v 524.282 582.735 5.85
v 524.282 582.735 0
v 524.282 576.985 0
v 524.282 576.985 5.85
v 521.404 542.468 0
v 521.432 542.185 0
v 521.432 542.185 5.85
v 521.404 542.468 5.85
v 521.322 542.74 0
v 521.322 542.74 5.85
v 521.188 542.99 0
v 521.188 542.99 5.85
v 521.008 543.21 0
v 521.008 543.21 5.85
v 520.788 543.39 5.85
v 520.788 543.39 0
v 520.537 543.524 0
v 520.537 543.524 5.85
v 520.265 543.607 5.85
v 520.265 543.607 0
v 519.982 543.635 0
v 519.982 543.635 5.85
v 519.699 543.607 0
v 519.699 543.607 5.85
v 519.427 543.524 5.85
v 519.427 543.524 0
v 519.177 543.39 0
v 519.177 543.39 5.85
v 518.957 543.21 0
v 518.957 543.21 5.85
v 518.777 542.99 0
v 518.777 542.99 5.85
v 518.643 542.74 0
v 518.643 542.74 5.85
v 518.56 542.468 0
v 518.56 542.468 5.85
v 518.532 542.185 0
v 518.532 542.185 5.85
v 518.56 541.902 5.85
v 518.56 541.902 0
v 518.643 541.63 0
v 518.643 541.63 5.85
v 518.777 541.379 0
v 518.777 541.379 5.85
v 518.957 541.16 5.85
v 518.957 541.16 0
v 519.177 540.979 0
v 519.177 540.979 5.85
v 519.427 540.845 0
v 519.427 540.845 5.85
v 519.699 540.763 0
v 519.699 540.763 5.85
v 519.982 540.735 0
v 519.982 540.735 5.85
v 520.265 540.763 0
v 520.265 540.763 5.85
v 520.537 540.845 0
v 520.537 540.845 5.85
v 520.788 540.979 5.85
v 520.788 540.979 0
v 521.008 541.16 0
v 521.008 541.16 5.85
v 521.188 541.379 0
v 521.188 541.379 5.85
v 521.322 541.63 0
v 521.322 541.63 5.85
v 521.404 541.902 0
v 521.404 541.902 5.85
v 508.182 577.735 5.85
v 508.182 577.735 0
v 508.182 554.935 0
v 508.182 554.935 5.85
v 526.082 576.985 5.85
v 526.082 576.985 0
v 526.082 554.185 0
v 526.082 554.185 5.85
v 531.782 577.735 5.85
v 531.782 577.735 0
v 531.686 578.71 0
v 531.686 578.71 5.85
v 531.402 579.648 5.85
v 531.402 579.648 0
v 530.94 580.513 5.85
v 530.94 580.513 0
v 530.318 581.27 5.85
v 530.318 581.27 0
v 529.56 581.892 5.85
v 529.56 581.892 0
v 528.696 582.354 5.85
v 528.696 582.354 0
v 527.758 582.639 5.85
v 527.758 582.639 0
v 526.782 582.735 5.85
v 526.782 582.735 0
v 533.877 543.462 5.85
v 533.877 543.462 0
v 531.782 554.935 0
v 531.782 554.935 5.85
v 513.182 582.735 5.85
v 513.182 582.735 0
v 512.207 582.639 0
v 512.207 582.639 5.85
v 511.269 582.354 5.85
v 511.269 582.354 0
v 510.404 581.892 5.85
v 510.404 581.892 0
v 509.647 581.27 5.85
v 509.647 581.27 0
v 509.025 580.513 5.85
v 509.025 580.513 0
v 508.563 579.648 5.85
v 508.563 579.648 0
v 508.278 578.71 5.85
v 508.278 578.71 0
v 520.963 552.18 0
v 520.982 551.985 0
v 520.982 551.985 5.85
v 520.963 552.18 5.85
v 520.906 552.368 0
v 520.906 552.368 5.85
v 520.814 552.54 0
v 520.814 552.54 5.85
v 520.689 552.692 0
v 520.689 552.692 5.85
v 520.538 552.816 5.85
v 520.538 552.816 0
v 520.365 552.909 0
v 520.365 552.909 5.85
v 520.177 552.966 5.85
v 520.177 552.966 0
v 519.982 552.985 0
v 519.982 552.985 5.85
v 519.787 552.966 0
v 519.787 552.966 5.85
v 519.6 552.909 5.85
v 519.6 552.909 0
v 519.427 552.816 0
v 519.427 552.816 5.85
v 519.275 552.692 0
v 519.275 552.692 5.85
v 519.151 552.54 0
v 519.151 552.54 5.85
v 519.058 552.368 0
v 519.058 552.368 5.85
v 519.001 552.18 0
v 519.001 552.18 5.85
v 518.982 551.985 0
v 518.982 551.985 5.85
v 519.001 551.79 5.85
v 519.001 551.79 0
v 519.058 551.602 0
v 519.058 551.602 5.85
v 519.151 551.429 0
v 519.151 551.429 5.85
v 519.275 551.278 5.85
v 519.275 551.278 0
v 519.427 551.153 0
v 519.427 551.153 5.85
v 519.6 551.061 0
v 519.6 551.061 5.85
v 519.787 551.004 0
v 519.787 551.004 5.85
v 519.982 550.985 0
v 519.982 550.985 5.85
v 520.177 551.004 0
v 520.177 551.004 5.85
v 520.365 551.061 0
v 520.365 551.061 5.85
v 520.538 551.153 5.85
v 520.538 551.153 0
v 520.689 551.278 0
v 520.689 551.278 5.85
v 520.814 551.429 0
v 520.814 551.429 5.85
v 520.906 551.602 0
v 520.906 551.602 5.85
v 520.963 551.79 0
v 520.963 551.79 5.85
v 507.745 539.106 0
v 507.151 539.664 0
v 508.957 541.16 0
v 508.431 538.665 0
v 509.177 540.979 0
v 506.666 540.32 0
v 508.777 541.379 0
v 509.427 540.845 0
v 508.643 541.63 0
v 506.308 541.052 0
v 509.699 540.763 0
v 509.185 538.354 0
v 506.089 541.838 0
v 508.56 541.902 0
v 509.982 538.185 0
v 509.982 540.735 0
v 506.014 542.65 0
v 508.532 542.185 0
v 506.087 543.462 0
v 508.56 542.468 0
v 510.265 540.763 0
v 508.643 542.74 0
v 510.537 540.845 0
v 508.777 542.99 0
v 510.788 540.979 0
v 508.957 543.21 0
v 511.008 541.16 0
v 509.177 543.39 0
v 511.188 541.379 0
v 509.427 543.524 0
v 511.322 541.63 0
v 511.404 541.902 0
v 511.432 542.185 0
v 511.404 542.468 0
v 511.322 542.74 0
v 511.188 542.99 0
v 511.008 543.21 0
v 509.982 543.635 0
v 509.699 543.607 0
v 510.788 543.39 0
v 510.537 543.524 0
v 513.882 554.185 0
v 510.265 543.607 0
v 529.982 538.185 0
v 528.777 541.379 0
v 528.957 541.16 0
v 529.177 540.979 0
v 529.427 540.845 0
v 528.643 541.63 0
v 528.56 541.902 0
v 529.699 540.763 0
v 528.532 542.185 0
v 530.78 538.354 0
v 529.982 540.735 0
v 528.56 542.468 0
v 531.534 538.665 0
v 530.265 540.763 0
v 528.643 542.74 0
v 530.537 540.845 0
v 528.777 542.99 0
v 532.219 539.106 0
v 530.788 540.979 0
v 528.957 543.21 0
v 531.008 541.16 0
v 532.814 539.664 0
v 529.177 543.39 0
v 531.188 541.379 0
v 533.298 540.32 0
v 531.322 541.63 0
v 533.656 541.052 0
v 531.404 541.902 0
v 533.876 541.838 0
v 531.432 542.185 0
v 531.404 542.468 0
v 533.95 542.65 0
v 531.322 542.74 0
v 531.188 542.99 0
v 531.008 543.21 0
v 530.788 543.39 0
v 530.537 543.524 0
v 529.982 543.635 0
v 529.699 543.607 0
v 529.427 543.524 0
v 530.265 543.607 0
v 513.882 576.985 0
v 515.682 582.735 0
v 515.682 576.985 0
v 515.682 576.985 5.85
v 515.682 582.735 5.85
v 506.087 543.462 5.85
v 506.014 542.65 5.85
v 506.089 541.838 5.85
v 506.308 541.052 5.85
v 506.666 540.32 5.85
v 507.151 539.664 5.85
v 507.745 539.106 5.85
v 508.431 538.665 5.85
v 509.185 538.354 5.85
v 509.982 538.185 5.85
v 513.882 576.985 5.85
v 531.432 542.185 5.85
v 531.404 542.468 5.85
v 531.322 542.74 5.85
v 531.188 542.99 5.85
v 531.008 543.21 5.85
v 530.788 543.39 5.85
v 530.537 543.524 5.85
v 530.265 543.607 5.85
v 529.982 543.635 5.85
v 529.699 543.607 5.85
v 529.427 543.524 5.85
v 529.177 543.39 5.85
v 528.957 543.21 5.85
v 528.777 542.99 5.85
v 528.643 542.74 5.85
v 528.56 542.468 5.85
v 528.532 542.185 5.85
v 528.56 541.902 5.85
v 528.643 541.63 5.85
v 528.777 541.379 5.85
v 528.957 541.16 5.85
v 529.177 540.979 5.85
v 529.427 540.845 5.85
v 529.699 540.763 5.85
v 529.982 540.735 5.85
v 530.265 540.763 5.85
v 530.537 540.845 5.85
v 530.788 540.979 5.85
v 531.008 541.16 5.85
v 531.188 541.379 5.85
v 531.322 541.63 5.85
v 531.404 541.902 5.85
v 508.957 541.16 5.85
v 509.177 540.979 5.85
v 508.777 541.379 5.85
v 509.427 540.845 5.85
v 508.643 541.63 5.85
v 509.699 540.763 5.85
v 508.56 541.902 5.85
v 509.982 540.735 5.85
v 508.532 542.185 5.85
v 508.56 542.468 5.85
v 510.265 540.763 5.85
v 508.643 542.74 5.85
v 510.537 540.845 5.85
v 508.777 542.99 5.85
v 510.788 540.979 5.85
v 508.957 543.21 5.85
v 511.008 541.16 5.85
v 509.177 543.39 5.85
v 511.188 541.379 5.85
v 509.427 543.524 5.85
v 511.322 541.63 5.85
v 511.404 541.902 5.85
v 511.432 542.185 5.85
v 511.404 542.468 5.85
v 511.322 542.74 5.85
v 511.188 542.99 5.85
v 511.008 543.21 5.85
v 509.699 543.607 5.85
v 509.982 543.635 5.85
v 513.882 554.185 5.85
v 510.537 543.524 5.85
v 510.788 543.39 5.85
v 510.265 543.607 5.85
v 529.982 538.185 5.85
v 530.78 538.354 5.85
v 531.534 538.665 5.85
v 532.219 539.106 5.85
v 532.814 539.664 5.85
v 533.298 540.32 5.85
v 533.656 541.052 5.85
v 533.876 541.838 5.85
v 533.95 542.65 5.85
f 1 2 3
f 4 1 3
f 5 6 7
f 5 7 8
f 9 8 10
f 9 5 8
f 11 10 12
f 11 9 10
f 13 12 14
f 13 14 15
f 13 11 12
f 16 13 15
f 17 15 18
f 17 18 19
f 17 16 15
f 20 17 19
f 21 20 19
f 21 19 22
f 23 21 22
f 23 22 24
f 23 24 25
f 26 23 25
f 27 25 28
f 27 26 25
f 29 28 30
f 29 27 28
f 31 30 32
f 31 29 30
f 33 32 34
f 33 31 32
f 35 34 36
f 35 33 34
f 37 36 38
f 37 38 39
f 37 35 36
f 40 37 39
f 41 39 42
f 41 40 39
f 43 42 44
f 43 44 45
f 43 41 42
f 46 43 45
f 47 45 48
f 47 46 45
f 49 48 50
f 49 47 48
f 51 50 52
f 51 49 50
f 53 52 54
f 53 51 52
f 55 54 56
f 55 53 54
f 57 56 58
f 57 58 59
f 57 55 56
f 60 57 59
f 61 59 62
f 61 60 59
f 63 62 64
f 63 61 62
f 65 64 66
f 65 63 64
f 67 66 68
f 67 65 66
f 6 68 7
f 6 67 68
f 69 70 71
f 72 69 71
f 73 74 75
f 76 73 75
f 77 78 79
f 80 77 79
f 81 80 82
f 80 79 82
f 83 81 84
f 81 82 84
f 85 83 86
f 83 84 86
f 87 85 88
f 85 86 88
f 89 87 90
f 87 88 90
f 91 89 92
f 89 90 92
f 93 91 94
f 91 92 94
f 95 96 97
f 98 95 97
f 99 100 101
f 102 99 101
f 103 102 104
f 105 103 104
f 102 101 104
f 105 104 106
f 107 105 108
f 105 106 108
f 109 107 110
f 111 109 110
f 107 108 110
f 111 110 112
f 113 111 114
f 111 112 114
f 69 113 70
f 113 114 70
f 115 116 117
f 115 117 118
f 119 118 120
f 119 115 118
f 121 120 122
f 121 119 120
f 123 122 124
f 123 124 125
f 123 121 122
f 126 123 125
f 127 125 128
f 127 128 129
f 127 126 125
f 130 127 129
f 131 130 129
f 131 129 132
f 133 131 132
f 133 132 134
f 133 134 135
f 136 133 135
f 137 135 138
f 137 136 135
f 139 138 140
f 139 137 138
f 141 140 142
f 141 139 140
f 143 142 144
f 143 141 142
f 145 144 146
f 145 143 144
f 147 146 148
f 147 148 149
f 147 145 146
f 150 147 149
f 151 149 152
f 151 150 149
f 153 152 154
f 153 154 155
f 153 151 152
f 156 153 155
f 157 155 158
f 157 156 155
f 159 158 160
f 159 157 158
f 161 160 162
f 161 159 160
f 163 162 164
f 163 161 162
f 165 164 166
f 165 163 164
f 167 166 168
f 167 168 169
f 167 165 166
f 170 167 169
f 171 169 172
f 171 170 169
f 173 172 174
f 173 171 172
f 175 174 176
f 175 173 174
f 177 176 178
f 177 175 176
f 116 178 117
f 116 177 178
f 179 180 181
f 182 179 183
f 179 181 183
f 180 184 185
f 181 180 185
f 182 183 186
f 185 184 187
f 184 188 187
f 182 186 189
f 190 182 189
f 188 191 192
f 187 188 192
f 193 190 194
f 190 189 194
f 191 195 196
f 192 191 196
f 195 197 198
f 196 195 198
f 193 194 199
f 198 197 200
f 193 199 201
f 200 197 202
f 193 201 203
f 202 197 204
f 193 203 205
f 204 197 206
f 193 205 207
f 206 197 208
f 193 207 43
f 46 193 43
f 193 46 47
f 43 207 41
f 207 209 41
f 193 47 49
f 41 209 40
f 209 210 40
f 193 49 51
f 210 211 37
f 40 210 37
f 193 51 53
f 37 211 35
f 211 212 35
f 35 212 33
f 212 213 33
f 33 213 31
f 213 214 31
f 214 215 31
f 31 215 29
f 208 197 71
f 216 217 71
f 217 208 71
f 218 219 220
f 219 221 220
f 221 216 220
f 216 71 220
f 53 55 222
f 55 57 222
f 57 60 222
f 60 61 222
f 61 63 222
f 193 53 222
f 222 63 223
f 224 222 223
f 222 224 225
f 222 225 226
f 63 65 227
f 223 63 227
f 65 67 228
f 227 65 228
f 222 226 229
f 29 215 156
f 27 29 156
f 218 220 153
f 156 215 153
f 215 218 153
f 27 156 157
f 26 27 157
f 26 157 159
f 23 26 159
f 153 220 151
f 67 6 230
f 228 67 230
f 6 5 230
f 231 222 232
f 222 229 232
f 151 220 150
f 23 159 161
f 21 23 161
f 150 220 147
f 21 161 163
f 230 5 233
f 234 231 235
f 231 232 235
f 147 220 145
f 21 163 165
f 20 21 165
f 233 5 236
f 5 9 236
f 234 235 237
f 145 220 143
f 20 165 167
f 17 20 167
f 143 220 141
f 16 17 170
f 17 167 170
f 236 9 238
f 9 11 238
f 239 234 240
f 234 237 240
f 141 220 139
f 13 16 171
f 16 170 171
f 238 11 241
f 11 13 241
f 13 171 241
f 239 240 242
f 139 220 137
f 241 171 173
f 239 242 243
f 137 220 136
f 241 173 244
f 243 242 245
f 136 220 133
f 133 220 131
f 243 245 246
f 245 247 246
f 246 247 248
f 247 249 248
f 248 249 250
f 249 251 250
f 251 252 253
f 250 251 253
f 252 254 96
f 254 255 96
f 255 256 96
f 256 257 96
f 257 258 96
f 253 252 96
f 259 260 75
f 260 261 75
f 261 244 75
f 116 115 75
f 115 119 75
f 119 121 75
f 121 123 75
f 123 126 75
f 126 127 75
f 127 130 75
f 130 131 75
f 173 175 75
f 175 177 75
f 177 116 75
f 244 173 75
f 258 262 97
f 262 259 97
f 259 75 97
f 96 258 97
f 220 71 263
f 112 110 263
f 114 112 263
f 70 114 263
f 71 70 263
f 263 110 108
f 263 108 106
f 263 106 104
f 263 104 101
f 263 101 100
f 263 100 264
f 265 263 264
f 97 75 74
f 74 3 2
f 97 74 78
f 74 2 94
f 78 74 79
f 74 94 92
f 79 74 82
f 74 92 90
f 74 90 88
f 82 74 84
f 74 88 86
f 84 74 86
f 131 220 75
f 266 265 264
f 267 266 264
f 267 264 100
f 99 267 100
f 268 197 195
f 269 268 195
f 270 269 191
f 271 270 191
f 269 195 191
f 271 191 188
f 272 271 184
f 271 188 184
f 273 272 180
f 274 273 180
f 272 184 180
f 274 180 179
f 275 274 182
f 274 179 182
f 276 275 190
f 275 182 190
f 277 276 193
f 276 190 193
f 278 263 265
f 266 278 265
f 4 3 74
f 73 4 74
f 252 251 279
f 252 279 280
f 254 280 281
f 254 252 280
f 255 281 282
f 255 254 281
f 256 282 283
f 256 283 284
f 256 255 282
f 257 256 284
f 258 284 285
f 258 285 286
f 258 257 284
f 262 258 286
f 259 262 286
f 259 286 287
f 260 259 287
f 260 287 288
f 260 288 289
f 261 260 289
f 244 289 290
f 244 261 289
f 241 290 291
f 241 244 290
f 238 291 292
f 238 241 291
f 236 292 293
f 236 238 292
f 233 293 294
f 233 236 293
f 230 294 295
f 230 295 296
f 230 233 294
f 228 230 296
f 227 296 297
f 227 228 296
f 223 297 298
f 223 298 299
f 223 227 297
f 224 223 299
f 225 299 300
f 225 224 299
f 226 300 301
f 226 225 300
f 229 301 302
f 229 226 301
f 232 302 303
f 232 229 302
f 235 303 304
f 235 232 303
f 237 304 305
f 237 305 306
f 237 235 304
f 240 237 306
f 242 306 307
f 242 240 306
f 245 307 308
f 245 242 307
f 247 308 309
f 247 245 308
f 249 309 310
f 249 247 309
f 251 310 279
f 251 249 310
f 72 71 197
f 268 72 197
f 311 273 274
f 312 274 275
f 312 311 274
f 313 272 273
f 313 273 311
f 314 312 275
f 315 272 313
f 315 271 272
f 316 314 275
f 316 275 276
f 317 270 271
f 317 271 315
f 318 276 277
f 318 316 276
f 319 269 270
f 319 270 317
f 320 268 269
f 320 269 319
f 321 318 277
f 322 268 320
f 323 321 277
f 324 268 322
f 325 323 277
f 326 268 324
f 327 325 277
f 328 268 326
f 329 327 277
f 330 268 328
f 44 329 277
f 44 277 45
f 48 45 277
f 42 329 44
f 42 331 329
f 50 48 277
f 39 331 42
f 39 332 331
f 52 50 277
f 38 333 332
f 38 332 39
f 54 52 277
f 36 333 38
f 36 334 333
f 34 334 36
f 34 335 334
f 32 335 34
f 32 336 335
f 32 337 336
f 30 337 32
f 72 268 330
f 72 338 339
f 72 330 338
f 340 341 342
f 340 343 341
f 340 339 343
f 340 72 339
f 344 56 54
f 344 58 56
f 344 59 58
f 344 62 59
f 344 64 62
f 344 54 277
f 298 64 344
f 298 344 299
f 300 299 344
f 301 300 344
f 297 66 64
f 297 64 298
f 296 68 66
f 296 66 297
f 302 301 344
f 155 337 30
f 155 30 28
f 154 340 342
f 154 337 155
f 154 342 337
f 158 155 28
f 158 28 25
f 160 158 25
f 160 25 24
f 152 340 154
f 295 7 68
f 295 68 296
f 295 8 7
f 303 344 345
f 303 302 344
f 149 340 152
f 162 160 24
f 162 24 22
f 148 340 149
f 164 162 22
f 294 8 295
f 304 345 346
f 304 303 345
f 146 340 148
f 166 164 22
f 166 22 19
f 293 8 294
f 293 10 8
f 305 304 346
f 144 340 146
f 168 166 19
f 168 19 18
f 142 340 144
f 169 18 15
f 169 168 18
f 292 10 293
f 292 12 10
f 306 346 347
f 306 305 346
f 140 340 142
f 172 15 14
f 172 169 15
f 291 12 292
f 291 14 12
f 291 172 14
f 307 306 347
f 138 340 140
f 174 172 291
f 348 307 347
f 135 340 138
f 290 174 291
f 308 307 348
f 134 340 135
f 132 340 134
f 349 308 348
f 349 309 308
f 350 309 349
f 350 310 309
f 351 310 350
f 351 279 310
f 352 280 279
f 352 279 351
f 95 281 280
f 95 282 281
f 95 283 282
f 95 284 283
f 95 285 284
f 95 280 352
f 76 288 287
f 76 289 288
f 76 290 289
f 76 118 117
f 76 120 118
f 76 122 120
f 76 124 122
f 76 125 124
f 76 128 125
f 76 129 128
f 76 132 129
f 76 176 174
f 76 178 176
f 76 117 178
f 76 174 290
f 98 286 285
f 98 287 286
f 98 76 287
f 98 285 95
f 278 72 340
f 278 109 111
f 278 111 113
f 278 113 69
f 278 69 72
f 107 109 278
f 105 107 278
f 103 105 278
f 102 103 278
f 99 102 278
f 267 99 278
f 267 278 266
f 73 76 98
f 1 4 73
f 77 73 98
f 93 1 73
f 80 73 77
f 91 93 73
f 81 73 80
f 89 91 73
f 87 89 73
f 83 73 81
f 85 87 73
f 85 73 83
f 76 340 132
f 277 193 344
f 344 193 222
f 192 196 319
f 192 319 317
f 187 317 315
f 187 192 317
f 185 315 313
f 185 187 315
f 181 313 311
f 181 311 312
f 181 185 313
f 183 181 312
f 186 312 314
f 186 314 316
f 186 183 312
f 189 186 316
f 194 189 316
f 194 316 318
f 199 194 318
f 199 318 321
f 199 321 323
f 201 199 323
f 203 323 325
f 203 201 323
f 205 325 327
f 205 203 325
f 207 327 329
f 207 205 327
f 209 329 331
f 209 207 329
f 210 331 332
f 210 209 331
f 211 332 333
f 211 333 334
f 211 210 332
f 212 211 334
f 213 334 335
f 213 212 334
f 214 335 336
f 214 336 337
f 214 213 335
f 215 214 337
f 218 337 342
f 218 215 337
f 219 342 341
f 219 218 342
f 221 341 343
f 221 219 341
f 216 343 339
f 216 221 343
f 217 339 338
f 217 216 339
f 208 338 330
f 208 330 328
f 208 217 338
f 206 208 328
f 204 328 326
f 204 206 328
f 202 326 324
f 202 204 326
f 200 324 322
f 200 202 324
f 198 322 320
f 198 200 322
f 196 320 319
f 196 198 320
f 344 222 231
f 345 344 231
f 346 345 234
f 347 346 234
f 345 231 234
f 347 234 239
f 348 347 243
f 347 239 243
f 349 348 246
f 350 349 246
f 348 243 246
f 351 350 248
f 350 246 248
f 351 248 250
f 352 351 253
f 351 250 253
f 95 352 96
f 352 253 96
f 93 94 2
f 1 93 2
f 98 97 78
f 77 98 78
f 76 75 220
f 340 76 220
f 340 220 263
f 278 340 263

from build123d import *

# Parameters (mm, degrees)
MODEL_R             = 1.45
MODEL_R_2           = 1
BOSS_EXTRUDE1_DEPTH = 5.85


with BuildPart() as part:
    # Model → Boss-Extrude1 (new body)
    with BuildSketch(Plane.XY):
        with BuildLine():
            Line((508.182236888, 554.934833401), (506.087301785, 543.461595882))
            ThreePointArc((506.087301785, 543.461595882), (506.893587564, 539.980874482), (509.982236888, 538.184833401))
            Line((509.982236888, 538.184833401), (529.982236888, 538.184833401))
            ThreePointArc((529.982236888, 538.184833401), (533.070886212, 539.980874482), (533.877171991, 543.461595882))
            Line((533.877171991, 543.461595882), (531.782236888, 554.934833401))
            Line((531.782236888, 554.934833401), (531.782236888, 577.734833401))
            ThreePointArc((531.782236888, 577.734833401), (530.317770794, 581.270367307), (526.782236888, 582.734833401))
            Line((526.782236888, 582.734833401), (524.282236888, 582.734833401))
            Line((524.282236888, 582.734833401), (524.282236888, 576.984833401))
            Line((524.282236888, 576.984833401), (526.082236888, 576.984833401))
            Line((526.082236888, 576.984833401), (526.082236888, 554.184833401))
            Line((526.082236888, 554.184833401), (513.882236888, 554.184833401))
            Line((513.882236888, 554.184833401), (513.882236888, 576.984833401))
            Line((513.882236888, 576.984833401), (515.682236888, 576.984833401))
            Line((515.682236888, 576.984833401), (515.682236888, 582.734833401))
            Line((515.682236888, 582.734833401), (513.182236888, 582.734833401))
            ThreePointArc((513.182236888, 582.734833401), (509.646702982, 581.270367307), (508.182236888, 577.734833401))
            Line((508.182236888, 577.734833401), (508.182236888, 554.934833401))
        make_face()
        with Locations(Location((509.982236888, 542.184833401, 0), (0, 0, 180))):
            Circle(MODEL_R, mode=Mode.SUBTRACT)
        with Locations((519.982236888, 542.184833401)):
            Circle(MODEL_R, mode=Mode.SUBTRACT)
        with Locations((529.982236888, 542.184833401)):
            Circle(MODEL_R, mode=Mode.SUBTRACT)
        with Locations((519.982236888, 551.984833401)):
            Circle(MODEL_R_2, mode=Mode.SUBTRACT)
    extrude(amount=BOSS_EXTRUDE1_DEPTH)


solid = part.part
